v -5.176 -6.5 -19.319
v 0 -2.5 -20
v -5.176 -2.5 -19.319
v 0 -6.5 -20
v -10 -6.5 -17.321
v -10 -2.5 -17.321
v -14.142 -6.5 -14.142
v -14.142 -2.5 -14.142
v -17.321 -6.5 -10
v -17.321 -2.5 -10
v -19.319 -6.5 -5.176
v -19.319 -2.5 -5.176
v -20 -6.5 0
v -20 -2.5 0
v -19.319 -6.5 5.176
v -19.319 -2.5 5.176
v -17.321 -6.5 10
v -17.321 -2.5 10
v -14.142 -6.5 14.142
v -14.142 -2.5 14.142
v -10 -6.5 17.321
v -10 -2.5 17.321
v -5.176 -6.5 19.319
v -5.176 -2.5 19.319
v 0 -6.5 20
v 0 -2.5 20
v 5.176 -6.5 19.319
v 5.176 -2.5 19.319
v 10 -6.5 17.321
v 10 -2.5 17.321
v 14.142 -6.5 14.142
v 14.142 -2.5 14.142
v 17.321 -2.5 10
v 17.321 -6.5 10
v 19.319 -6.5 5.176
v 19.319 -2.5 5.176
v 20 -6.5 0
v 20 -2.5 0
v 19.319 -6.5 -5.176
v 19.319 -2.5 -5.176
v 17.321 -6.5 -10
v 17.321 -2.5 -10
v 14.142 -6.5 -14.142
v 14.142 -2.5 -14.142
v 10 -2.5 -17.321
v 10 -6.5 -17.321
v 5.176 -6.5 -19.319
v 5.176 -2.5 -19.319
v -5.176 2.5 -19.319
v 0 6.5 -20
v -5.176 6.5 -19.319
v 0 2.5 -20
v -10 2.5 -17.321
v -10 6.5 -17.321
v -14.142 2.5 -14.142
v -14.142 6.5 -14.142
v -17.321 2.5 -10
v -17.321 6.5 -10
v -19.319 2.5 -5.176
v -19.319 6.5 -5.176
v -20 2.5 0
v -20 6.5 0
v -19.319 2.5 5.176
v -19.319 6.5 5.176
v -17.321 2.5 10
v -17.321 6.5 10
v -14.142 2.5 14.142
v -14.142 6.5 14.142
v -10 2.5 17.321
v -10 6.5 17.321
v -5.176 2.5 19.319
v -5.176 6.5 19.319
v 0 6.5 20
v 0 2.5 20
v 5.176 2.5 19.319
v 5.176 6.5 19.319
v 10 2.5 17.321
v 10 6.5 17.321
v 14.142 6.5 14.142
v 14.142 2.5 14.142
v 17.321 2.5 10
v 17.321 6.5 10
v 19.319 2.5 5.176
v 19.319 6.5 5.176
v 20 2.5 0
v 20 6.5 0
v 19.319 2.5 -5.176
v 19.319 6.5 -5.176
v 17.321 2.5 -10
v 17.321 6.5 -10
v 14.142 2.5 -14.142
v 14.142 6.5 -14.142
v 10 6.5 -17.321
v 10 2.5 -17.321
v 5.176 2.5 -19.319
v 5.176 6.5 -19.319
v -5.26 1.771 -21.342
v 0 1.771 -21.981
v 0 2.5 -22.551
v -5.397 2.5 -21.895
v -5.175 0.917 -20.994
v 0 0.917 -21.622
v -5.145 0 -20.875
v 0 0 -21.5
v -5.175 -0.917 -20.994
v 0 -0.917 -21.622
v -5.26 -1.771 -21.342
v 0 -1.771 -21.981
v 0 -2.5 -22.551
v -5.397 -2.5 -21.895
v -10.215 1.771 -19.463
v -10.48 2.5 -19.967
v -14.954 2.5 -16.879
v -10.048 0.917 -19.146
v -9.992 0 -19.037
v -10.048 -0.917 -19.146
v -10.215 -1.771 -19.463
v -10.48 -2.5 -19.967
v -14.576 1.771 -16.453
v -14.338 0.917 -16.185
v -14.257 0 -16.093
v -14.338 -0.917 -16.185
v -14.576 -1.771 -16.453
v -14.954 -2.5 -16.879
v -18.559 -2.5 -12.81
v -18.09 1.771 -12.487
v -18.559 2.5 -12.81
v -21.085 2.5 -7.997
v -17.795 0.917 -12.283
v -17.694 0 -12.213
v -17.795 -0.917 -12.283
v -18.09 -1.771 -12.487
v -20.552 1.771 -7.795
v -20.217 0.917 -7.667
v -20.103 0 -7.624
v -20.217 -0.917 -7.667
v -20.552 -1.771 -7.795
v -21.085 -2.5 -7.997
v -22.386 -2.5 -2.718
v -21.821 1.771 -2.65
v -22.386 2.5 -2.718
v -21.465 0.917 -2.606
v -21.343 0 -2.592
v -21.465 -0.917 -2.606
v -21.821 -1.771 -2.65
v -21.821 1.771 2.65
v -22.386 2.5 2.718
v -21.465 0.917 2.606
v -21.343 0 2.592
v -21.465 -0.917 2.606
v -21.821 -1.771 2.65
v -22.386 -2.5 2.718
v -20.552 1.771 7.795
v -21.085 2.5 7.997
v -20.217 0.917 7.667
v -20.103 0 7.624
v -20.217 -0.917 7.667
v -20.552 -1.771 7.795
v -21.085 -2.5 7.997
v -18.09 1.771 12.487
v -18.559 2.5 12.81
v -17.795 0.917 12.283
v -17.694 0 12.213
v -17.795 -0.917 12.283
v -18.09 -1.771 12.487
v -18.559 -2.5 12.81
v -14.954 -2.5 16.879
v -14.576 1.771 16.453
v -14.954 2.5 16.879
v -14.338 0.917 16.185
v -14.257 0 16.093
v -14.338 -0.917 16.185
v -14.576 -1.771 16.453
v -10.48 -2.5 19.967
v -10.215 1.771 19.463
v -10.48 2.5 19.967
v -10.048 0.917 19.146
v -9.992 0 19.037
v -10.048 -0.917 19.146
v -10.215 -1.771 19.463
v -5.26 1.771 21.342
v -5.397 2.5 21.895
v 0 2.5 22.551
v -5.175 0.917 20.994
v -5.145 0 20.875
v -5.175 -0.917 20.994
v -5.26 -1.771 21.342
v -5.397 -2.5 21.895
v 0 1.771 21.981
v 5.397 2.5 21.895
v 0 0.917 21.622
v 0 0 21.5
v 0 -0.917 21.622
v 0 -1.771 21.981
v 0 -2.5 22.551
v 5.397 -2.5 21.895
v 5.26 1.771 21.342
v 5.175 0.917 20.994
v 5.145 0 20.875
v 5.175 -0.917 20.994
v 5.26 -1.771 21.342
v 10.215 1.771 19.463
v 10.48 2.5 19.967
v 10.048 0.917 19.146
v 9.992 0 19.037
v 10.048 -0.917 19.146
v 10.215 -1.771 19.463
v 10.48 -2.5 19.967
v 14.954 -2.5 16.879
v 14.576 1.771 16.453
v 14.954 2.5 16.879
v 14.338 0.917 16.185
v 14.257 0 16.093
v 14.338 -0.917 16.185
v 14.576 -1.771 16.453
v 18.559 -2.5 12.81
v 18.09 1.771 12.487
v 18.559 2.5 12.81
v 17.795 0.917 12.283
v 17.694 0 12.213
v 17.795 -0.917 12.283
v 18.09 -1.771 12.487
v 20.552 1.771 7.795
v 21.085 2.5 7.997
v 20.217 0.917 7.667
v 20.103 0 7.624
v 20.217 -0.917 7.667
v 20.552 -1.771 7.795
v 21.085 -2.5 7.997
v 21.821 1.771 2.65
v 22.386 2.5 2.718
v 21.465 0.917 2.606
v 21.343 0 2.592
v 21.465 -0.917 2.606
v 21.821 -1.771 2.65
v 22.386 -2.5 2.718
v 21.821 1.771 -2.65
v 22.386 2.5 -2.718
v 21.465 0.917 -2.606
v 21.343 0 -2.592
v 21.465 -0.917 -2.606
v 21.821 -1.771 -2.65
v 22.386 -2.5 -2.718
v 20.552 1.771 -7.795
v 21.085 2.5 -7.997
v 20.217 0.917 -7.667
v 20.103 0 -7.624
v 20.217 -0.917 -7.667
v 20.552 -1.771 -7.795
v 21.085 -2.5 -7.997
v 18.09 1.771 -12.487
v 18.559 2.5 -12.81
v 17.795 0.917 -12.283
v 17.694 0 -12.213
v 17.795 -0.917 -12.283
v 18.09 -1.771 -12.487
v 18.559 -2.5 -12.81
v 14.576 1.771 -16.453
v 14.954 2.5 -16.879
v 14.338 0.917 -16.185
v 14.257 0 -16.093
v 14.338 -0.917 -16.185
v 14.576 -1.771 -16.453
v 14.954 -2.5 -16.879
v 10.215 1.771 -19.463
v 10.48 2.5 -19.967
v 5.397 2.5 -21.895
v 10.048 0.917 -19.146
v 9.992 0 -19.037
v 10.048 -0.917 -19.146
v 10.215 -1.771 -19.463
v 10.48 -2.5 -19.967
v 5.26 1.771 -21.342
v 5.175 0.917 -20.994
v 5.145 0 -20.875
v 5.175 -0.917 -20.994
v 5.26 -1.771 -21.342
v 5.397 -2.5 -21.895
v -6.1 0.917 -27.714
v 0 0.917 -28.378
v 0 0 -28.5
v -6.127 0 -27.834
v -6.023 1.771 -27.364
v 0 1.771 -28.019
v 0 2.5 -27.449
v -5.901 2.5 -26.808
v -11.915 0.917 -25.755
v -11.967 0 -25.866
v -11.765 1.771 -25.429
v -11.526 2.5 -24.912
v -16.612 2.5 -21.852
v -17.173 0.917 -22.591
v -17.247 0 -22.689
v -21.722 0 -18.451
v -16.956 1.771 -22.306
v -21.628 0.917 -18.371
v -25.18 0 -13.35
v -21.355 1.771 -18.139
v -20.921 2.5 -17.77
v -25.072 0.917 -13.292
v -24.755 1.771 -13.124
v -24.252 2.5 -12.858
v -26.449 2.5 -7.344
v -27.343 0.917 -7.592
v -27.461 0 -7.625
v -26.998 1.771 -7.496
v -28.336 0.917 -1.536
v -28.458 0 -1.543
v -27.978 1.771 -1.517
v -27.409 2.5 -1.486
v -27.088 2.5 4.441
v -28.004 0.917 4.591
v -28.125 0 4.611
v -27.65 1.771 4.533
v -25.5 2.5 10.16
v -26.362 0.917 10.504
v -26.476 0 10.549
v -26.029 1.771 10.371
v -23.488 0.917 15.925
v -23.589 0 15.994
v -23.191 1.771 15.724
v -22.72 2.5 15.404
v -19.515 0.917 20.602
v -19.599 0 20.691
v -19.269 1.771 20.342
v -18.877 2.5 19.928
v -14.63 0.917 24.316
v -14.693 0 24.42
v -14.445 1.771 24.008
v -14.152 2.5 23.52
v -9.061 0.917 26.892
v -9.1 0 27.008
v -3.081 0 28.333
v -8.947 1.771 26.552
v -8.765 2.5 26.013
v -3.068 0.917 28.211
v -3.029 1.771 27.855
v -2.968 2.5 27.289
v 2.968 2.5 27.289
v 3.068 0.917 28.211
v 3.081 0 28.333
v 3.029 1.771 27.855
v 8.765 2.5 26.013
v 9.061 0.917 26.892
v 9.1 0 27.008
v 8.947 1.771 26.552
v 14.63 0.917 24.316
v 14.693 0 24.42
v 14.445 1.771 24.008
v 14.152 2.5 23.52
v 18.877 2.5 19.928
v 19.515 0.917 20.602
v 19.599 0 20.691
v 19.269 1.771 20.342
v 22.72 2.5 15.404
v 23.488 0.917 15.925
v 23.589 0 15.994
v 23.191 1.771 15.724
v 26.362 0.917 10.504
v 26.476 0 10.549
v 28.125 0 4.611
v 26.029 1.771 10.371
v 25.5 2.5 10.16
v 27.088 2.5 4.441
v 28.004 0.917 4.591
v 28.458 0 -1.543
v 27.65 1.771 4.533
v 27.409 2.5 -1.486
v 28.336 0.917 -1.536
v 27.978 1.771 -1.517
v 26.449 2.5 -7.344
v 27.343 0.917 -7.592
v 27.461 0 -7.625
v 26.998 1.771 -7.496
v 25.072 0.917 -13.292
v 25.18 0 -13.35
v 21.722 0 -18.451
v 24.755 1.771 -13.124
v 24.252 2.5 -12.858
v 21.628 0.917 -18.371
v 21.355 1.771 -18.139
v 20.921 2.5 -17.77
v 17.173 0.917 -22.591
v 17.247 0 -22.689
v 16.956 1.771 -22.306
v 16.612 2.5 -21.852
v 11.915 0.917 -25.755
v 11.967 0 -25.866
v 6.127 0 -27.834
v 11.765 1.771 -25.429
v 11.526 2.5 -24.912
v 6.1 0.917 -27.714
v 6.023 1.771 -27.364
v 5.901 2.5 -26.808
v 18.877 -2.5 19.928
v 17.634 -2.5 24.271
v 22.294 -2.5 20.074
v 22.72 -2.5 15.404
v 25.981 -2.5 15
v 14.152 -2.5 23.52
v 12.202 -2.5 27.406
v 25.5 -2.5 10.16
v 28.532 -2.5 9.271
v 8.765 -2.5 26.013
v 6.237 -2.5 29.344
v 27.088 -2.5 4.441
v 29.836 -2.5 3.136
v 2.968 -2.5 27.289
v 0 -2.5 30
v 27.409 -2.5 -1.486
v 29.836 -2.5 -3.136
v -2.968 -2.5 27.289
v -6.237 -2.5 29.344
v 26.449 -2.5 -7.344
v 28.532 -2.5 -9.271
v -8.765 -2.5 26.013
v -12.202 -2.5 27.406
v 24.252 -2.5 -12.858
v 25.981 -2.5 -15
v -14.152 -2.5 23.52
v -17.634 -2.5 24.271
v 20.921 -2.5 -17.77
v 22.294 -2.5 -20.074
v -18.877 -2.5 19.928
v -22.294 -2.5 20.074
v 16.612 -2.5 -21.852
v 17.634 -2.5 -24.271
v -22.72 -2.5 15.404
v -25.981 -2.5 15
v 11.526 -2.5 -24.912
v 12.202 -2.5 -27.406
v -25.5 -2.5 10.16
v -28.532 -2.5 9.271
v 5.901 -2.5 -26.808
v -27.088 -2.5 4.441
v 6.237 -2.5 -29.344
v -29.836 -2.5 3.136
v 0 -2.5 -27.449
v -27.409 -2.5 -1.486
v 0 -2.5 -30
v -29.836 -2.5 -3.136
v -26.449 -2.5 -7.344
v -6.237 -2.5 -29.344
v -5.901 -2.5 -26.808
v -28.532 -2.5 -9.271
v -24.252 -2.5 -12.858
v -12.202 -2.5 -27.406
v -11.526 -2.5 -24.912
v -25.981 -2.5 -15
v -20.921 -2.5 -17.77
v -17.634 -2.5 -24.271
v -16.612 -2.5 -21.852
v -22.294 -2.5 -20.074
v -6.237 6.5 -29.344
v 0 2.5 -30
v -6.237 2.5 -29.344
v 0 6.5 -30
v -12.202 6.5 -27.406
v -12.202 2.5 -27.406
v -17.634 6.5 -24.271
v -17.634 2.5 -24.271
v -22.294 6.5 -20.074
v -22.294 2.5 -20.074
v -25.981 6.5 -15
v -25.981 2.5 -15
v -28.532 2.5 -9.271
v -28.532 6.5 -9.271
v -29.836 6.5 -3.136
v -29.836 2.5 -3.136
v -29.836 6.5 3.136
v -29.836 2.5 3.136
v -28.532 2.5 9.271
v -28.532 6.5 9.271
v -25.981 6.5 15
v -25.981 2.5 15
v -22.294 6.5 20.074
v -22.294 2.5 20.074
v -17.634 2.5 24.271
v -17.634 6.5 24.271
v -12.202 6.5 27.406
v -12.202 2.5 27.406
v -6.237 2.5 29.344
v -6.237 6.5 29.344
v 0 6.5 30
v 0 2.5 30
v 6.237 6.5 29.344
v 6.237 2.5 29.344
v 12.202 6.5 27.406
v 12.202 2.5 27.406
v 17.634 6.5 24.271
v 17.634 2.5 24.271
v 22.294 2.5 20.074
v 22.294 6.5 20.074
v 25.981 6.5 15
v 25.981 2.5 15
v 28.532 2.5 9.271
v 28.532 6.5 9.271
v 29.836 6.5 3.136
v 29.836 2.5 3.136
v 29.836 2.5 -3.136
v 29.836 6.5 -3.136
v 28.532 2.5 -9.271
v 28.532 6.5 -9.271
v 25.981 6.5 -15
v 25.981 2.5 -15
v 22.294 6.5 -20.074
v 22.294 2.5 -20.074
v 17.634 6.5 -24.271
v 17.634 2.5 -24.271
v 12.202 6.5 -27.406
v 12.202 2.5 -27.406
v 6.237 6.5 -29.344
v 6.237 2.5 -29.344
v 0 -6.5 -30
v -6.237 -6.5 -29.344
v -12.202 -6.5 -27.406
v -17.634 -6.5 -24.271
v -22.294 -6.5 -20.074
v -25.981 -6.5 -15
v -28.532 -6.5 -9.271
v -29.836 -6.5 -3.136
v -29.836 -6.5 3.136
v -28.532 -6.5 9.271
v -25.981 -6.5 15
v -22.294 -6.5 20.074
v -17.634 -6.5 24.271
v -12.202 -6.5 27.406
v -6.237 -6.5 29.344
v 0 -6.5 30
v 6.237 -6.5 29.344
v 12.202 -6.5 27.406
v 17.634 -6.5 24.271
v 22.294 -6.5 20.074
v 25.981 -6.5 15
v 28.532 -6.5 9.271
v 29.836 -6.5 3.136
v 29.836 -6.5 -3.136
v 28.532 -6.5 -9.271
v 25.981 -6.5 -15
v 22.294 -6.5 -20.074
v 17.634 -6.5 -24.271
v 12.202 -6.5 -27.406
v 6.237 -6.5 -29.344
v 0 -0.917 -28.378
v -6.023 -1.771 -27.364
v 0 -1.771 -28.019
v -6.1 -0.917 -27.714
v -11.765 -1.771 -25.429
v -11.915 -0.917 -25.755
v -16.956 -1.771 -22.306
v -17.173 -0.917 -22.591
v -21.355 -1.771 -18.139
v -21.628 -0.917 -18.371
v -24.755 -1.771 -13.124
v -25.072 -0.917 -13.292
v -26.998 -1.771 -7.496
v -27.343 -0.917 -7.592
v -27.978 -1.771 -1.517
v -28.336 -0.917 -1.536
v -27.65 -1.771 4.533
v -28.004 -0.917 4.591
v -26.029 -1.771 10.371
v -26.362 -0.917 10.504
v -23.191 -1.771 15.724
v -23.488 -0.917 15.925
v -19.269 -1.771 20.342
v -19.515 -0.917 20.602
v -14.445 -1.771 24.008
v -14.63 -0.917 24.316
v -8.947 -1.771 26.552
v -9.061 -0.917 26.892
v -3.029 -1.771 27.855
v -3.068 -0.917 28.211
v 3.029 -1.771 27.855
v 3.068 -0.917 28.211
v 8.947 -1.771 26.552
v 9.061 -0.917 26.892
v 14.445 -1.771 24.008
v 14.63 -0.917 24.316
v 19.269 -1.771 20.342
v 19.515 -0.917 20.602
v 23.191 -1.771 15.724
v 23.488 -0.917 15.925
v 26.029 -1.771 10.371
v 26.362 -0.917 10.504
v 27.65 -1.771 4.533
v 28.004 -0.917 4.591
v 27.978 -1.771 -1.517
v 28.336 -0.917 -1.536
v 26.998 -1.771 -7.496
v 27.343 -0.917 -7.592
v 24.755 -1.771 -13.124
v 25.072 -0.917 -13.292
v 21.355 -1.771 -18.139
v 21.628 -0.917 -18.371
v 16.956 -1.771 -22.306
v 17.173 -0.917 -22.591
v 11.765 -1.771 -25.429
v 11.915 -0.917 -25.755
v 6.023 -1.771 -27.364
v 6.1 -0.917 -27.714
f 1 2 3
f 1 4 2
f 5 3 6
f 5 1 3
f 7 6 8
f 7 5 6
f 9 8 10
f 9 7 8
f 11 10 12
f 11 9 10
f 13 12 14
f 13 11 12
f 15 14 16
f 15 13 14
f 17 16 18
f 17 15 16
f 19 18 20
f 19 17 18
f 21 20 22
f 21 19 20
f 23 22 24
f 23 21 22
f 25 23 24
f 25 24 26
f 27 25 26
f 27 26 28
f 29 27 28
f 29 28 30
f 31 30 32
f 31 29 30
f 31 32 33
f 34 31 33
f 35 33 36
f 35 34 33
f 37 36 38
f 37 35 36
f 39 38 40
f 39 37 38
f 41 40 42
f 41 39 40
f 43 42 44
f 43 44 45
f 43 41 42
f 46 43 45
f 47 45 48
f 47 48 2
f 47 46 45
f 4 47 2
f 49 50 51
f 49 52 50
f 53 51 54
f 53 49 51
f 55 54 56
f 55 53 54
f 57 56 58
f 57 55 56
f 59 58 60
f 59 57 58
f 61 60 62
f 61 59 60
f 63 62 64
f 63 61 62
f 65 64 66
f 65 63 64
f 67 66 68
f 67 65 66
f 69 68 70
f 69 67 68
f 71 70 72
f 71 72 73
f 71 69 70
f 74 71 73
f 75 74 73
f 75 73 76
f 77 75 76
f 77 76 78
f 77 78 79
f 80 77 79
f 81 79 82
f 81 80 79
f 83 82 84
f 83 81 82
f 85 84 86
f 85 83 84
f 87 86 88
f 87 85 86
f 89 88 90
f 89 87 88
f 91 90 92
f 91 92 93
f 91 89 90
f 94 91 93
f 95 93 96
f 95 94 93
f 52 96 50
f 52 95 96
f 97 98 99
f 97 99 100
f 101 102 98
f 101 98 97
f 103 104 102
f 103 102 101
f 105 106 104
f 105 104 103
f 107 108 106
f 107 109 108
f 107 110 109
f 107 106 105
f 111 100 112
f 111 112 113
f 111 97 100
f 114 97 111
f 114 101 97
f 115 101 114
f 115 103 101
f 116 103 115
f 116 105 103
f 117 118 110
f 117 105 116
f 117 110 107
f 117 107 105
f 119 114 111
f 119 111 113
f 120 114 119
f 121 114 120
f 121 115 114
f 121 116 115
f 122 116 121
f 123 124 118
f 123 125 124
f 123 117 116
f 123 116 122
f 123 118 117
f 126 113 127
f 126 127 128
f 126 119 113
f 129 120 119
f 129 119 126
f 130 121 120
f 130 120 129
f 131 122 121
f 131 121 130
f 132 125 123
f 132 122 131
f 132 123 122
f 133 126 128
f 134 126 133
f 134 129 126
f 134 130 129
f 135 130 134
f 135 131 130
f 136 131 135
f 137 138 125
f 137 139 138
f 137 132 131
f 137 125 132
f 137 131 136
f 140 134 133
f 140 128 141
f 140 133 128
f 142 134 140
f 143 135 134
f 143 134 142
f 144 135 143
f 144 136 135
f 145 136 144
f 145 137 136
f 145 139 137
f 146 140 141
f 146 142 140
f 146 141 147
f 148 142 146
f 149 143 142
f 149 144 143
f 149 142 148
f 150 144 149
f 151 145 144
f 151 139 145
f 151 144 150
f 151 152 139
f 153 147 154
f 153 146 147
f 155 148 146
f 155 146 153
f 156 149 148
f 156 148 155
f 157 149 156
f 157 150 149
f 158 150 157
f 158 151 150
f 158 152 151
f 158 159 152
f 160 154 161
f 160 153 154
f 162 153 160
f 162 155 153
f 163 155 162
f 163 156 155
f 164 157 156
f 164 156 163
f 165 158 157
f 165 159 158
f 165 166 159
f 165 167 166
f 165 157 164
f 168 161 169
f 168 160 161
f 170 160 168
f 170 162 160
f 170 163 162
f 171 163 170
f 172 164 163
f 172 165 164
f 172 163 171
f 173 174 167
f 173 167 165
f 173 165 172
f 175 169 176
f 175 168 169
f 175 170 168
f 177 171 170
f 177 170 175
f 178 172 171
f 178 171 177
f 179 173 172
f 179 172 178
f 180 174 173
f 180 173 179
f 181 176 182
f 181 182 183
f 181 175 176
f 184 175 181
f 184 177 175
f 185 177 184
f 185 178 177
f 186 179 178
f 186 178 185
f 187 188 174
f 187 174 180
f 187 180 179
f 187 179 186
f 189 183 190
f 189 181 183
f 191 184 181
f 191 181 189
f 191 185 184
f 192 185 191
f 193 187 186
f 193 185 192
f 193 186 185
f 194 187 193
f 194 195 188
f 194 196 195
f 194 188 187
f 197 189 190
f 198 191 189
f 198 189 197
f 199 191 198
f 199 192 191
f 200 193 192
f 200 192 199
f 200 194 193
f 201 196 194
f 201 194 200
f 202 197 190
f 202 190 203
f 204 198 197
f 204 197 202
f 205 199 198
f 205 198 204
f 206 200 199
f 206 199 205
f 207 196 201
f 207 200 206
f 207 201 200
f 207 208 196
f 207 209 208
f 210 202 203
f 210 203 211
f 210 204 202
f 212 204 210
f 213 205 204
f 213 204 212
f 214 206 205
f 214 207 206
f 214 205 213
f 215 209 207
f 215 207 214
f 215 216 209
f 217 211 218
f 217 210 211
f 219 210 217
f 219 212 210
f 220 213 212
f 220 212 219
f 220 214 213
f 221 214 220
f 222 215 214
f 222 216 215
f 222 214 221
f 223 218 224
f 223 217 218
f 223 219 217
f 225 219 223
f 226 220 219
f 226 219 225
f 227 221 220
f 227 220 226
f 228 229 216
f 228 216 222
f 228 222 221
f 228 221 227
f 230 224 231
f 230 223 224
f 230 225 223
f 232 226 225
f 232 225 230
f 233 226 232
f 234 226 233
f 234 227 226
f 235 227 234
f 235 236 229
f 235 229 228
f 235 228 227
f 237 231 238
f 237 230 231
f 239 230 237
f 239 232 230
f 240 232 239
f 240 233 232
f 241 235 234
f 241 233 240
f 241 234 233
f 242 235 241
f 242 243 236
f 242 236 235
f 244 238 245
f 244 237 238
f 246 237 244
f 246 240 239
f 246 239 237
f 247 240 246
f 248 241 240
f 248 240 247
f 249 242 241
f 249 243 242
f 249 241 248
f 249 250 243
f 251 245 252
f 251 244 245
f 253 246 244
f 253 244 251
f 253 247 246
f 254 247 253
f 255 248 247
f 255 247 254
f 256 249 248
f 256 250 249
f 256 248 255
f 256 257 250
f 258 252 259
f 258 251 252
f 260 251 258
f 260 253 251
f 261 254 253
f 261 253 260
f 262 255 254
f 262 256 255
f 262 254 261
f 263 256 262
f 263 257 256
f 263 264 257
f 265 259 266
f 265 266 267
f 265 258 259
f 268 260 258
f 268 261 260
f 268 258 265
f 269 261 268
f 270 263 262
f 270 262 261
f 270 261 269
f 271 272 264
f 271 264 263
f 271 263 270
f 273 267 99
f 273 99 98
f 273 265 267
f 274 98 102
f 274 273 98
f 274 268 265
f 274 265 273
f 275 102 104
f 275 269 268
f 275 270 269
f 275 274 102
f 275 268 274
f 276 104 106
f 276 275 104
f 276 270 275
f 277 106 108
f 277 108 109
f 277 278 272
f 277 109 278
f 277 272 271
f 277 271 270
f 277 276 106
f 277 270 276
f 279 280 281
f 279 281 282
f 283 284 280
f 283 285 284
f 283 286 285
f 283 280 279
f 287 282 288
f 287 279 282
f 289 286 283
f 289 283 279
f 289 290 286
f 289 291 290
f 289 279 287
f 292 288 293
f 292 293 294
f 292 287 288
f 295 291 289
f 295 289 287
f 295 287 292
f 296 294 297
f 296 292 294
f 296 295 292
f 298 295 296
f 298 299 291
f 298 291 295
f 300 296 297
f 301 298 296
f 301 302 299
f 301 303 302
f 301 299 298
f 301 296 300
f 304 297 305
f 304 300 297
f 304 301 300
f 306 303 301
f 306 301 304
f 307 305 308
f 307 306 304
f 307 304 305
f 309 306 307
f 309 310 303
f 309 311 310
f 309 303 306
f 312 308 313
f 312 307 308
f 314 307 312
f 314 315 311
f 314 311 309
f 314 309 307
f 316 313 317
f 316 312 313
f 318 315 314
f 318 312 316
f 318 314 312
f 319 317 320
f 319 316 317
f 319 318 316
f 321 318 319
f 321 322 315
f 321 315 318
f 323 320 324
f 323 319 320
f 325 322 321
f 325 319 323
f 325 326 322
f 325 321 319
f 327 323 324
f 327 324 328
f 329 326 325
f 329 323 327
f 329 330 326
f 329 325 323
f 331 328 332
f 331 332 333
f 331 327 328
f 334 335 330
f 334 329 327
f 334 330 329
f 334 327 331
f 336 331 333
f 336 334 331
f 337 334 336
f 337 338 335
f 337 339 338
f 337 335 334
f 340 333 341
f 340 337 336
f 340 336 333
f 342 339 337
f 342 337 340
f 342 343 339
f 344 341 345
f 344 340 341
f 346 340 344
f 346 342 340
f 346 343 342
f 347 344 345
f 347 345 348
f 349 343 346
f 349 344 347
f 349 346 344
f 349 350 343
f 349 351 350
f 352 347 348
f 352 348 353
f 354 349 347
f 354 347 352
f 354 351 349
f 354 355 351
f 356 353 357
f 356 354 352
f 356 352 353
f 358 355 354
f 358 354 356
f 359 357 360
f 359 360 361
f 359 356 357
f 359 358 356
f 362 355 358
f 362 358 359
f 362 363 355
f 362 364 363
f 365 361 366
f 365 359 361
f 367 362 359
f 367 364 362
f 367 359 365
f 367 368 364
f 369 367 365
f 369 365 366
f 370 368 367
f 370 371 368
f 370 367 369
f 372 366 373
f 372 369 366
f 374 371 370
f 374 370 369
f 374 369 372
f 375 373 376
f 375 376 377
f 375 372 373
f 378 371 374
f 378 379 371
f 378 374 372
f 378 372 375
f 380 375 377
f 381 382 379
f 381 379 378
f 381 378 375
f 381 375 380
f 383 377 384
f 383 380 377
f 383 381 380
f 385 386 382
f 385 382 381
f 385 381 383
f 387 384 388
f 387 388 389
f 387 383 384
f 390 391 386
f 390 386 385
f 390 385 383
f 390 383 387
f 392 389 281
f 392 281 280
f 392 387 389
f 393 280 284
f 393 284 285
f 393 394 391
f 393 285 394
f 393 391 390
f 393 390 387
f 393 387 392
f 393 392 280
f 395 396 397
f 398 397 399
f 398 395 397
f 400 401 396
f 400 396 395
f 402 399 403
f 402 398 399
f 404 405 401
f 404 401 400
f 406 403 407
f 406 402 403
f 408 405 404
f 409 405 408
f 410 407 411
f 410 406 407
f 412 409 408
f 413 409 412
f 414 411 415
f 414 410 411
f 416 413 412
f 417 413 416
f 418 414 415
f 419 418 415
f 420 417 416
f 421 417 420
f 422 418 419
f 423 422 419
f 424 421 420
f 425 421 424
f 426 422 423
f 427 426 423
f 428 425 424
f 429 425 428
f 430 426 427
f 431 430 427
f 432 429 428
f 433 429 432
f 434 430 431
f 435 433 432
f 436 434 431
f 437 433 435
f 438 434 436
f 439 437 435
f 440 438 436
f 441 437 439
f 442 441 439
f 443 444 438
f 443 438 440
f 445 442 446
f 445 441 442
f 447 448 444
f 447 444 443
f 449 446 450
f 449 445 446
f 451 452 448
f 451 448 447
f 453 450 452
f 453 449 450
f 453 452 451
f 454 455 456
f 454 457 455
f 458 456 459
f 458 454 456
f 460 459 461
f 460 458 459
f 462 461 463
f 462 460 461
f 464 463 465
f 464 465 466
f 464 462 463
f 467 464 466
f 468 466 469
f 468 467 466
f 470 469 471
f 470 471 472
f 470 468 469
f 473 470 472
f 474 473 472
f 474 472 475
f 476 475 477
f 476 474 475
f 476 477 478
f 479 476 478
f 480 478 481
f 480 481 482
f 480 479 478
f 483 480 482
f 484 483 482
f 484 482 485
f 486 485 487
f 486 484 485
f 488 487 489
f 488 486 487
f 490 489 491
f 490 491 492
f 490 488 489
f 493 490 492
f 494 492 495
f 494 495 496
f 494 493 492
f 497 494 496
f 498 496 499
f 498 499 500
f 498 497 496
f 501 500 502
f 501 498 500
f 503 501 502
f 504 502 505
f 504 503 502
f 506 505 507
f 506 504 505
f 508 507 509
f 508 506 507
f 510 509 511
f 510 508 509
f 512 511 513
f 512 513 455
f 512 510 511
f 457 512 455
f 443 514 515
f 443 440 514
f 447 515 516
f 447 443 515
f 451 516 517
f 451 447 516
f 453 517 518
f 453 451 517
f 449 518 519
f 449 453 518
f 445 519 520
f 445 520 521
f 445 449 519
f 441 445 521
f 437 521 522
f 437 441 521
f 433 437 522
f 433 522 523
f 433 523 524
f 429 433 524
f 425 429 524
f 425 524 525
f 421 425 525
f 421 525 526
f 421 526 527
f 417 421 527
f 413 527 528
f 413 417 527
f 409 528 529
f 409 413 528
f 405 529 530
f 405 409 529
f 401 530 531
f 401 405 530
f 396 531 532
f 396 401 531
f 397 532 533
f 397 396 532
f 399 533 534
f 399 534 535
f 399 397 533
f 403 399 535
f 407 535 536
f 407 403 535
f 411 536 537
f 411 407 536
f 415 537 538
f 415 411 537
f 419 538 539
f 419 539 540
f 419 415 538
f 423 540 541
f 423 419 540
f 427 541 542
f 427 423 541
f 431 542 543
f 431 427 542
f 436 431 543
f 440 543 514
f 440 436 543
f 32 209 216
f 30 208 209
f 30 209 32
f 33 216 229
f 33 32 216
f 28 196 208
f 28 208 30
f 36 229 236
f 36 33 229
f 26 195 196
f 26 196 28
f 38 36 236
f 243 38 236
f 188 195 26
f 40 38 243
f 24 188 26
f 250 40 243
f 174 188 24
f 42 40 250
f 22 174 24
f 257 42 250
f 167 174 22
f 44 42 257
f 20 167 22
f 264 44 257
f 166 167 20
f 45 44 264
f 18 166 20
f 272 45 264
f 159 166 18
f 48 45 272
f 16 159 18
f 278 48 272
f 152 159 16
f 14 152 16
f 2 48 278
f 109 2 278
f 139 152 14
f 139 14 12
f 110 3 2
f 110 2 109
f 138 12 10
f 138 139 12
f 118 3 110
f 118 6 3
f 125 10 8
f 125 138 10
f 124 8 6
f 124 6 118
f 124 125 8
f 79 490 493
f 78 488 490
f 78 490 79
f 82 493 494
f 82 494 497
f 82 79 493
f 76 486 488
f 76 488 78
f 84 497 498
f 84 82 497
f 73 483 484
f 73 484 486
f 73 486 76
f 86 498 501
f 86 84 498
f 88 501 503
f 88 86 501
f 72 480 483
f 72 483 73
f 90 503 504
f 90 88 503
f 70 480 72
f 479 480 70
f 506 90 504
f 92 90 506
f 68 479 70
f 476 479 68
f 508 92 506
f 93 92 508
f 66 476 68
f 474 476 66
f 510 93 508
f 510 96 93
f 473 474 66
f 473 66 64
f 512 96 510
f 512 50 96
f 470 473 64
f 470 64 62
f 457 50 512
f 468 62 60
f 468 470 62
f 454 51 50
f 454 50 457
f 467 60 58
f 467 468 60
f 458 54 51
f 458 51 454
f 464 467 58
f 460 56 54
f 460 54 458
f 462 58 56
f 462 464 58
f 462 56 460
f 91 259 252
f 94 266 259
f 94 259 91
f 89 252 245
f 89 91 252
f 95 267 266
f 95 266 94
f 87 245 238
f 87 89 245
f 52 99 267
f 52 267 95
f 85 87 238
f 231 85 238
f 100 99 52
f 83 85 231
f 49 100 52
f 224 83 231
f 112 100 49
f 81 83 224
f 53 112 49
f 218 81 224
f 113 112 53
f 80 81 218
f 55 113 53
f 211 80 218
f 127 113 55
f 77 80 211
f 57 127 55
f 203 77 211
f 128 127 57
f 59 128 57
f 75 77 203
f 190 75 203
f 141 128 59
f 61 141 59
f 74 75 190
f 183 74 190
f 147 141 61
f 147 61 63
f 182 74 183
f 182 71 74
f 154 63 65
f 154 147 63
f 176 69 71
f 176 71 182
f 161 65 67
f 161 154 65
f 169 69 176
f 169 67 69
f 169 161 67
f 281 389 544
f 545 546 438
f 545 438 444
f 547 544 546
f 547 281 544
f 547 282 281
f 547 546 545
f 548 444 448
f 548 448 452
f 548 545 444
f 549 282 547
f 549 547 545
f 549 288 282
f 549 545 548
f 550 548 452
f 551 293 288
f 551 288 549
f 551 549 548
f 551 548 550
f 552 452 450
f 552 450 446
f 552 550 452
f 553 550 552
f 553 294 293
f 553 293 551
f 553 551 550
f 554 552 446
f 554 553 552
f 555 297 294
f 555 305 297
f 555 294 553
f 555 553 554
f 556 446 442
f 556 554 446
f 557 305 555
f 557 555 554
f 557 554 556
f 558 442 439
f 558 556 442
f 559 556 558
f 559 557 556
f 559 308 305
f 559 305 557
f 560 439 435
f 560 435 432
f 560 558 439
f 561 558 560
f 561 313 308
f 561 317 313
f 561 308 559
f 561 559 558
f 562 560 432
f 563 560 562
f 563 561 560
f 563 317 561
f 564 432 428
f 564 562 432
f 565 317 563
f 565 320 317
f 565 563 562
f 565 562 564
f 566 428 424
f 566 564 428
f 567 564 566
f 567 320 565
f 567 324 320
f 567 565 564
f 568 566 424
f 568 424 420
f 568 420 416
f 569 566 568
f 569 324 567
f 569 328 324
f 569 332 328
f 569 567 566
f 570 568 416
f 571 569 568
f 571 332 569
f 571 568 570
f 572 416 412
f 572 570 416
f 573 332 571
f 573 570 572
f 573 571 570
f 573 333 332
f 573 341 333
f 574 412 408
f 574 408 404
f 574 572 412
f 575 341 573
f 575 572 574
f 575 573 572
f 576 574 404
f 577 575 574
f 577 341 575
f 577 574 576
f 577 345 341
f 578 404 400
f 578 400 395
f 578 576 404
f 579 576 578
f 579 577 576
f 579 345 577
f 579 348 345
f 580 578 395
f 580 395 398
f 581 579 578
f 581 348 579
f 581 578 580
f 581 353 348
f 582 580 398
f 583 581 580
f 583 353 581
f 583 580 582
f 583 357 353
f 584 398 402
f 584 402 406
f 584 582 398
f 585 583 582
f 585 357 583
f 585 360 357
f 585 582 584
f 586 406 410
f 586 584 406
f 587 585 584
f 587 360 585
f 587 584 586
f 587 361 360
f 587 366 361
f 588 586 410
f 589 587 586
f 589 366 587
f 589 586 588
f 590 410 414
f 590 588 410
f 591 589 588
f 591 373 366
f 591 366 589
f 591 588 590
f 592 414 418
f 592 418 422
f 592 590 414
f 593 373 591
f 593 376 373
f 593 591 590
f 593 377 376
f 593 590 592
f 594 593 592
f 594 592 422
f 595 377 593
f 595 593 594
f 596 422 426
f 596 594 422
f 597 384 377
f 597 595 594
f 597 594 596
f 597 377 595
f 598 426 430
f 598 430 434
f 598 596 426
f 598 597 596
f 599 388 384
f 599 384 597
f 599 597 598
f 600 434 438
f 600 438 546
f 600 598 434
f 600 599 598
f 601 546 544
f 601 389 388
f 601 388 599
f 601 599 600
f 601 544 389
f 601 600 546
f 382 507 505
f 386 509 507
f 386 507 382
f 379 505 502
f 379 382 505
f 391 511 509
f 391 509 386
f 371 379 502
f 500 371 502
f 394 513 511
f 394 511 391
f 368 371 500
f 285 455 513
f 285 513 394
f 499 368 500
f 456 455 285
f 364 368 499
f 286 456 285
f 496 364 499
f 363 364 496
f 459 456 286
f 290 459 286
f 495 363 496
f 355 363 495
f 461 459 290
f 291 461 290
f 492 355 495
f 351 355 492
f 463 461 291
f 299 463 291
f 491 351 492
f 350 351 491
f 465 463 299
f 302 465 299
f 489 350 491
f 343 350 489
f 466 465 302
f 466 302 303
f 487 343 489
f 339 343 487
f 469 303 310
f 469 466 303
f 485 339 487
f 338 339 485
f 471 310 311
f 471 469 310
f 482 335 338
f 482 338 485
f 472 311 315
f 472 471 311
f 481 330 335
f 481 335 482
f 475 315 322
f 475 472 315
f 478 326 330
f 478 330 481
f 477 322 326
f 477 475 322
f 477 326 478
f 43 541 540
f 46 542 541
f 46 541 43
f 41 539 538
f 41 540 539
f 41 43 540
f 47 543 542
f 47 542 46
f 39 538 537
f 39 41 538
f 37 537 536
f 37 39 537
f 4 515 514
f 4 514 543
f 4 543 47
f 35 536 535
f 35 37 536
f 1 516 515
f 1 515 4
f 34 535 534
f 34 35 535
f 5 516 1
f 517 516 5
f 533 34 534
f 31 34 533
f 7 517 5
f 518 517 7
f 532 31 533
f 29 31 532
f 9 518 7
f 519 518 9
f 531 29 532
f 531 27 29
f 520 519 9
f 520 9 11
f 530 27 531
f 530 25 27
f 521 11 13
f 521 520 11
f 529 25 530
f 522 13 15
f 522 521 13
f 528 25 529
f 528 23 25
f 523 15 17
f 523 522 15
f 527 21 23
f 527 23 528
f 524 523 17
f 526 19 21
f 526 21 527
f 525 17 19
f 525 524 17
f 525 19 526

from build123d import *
from build123d.topology import SkipClean


with BuildPart() as part:
    # Sketch1 → Revolve1 (revolve)
    with SkipClean():  # the faces are left unmerged after this step: merging them gives an invalid solid
        with BuildSketch(Plane.XY, mode=Mode.PRIVATE) as revolve1_sk:
            with BuildLine():
                Line((20, 6.5), (20, 2.5))
                Line((20, 2.5), (22.550510257, 2.5))
                ThreePointArc((22.550510257, 2.5), (25, 3.5), (27.449489743, 2.5))
                Line((27.449489743, 2.5), (30, 2.5))
                Line((30, 2.5), (30, 6.5))
                Line((30, 6.5), (20, 6.5))
            make_face()
            with BuildLine():
                Line((27.449489743, 2.5), (22.550510257, 2.5))
                ThreePointArc((22.550510257, 2.5), (21.5, 0), (22.550510257, -2.5))
                Line((22.550510257, -2.5), (27.449489743, -2.5))
                ThreePointArc((27.449489743, -2.5), (28.226702194, -1.355873501), (28.5, 0))
                ThreePointArc((28.5, 0), (28.226702194, 1.355873501), (27.449489743, 2.5))
            make_face()
            with BuildLine():
                ThreePointArc((27.449489743, 2.5), (25, 3.5), (22.550510257, 2.5))
                Line((22.550510257, 2.5), (27.449489743, 2.5))
            make_face()
            with BuildLine():
                Line((27.449489743, -2.5), (22.550510257, -2.5))
                ThreePointArc((22.550510257, -2.5), (25, -3.5), (27.449489743, -2.5))
            make_face()
            with BuildLine():
                Line((22.550510257, -2.5), (20, -2.5))
                Line((20, -2.5), (20, -6.5))
                Line((20, -6.5), (30, -6.5))
                Line((30, -6.5), (30, -2.5))
                Line((30, -2.5), (27.449489743, -2.5))
                ThreePointArc((27.449489743, -2.5), (25, -3.5), (22.550510257, -2.5))
            make_face()
        revolve(revolve1_sk.sketch.rotate(Axis((0, 0, 0), (0, 1, 0)), 90), axis=Axis((0, 0, 0), (0, 1, 0)))


solid = part.part
